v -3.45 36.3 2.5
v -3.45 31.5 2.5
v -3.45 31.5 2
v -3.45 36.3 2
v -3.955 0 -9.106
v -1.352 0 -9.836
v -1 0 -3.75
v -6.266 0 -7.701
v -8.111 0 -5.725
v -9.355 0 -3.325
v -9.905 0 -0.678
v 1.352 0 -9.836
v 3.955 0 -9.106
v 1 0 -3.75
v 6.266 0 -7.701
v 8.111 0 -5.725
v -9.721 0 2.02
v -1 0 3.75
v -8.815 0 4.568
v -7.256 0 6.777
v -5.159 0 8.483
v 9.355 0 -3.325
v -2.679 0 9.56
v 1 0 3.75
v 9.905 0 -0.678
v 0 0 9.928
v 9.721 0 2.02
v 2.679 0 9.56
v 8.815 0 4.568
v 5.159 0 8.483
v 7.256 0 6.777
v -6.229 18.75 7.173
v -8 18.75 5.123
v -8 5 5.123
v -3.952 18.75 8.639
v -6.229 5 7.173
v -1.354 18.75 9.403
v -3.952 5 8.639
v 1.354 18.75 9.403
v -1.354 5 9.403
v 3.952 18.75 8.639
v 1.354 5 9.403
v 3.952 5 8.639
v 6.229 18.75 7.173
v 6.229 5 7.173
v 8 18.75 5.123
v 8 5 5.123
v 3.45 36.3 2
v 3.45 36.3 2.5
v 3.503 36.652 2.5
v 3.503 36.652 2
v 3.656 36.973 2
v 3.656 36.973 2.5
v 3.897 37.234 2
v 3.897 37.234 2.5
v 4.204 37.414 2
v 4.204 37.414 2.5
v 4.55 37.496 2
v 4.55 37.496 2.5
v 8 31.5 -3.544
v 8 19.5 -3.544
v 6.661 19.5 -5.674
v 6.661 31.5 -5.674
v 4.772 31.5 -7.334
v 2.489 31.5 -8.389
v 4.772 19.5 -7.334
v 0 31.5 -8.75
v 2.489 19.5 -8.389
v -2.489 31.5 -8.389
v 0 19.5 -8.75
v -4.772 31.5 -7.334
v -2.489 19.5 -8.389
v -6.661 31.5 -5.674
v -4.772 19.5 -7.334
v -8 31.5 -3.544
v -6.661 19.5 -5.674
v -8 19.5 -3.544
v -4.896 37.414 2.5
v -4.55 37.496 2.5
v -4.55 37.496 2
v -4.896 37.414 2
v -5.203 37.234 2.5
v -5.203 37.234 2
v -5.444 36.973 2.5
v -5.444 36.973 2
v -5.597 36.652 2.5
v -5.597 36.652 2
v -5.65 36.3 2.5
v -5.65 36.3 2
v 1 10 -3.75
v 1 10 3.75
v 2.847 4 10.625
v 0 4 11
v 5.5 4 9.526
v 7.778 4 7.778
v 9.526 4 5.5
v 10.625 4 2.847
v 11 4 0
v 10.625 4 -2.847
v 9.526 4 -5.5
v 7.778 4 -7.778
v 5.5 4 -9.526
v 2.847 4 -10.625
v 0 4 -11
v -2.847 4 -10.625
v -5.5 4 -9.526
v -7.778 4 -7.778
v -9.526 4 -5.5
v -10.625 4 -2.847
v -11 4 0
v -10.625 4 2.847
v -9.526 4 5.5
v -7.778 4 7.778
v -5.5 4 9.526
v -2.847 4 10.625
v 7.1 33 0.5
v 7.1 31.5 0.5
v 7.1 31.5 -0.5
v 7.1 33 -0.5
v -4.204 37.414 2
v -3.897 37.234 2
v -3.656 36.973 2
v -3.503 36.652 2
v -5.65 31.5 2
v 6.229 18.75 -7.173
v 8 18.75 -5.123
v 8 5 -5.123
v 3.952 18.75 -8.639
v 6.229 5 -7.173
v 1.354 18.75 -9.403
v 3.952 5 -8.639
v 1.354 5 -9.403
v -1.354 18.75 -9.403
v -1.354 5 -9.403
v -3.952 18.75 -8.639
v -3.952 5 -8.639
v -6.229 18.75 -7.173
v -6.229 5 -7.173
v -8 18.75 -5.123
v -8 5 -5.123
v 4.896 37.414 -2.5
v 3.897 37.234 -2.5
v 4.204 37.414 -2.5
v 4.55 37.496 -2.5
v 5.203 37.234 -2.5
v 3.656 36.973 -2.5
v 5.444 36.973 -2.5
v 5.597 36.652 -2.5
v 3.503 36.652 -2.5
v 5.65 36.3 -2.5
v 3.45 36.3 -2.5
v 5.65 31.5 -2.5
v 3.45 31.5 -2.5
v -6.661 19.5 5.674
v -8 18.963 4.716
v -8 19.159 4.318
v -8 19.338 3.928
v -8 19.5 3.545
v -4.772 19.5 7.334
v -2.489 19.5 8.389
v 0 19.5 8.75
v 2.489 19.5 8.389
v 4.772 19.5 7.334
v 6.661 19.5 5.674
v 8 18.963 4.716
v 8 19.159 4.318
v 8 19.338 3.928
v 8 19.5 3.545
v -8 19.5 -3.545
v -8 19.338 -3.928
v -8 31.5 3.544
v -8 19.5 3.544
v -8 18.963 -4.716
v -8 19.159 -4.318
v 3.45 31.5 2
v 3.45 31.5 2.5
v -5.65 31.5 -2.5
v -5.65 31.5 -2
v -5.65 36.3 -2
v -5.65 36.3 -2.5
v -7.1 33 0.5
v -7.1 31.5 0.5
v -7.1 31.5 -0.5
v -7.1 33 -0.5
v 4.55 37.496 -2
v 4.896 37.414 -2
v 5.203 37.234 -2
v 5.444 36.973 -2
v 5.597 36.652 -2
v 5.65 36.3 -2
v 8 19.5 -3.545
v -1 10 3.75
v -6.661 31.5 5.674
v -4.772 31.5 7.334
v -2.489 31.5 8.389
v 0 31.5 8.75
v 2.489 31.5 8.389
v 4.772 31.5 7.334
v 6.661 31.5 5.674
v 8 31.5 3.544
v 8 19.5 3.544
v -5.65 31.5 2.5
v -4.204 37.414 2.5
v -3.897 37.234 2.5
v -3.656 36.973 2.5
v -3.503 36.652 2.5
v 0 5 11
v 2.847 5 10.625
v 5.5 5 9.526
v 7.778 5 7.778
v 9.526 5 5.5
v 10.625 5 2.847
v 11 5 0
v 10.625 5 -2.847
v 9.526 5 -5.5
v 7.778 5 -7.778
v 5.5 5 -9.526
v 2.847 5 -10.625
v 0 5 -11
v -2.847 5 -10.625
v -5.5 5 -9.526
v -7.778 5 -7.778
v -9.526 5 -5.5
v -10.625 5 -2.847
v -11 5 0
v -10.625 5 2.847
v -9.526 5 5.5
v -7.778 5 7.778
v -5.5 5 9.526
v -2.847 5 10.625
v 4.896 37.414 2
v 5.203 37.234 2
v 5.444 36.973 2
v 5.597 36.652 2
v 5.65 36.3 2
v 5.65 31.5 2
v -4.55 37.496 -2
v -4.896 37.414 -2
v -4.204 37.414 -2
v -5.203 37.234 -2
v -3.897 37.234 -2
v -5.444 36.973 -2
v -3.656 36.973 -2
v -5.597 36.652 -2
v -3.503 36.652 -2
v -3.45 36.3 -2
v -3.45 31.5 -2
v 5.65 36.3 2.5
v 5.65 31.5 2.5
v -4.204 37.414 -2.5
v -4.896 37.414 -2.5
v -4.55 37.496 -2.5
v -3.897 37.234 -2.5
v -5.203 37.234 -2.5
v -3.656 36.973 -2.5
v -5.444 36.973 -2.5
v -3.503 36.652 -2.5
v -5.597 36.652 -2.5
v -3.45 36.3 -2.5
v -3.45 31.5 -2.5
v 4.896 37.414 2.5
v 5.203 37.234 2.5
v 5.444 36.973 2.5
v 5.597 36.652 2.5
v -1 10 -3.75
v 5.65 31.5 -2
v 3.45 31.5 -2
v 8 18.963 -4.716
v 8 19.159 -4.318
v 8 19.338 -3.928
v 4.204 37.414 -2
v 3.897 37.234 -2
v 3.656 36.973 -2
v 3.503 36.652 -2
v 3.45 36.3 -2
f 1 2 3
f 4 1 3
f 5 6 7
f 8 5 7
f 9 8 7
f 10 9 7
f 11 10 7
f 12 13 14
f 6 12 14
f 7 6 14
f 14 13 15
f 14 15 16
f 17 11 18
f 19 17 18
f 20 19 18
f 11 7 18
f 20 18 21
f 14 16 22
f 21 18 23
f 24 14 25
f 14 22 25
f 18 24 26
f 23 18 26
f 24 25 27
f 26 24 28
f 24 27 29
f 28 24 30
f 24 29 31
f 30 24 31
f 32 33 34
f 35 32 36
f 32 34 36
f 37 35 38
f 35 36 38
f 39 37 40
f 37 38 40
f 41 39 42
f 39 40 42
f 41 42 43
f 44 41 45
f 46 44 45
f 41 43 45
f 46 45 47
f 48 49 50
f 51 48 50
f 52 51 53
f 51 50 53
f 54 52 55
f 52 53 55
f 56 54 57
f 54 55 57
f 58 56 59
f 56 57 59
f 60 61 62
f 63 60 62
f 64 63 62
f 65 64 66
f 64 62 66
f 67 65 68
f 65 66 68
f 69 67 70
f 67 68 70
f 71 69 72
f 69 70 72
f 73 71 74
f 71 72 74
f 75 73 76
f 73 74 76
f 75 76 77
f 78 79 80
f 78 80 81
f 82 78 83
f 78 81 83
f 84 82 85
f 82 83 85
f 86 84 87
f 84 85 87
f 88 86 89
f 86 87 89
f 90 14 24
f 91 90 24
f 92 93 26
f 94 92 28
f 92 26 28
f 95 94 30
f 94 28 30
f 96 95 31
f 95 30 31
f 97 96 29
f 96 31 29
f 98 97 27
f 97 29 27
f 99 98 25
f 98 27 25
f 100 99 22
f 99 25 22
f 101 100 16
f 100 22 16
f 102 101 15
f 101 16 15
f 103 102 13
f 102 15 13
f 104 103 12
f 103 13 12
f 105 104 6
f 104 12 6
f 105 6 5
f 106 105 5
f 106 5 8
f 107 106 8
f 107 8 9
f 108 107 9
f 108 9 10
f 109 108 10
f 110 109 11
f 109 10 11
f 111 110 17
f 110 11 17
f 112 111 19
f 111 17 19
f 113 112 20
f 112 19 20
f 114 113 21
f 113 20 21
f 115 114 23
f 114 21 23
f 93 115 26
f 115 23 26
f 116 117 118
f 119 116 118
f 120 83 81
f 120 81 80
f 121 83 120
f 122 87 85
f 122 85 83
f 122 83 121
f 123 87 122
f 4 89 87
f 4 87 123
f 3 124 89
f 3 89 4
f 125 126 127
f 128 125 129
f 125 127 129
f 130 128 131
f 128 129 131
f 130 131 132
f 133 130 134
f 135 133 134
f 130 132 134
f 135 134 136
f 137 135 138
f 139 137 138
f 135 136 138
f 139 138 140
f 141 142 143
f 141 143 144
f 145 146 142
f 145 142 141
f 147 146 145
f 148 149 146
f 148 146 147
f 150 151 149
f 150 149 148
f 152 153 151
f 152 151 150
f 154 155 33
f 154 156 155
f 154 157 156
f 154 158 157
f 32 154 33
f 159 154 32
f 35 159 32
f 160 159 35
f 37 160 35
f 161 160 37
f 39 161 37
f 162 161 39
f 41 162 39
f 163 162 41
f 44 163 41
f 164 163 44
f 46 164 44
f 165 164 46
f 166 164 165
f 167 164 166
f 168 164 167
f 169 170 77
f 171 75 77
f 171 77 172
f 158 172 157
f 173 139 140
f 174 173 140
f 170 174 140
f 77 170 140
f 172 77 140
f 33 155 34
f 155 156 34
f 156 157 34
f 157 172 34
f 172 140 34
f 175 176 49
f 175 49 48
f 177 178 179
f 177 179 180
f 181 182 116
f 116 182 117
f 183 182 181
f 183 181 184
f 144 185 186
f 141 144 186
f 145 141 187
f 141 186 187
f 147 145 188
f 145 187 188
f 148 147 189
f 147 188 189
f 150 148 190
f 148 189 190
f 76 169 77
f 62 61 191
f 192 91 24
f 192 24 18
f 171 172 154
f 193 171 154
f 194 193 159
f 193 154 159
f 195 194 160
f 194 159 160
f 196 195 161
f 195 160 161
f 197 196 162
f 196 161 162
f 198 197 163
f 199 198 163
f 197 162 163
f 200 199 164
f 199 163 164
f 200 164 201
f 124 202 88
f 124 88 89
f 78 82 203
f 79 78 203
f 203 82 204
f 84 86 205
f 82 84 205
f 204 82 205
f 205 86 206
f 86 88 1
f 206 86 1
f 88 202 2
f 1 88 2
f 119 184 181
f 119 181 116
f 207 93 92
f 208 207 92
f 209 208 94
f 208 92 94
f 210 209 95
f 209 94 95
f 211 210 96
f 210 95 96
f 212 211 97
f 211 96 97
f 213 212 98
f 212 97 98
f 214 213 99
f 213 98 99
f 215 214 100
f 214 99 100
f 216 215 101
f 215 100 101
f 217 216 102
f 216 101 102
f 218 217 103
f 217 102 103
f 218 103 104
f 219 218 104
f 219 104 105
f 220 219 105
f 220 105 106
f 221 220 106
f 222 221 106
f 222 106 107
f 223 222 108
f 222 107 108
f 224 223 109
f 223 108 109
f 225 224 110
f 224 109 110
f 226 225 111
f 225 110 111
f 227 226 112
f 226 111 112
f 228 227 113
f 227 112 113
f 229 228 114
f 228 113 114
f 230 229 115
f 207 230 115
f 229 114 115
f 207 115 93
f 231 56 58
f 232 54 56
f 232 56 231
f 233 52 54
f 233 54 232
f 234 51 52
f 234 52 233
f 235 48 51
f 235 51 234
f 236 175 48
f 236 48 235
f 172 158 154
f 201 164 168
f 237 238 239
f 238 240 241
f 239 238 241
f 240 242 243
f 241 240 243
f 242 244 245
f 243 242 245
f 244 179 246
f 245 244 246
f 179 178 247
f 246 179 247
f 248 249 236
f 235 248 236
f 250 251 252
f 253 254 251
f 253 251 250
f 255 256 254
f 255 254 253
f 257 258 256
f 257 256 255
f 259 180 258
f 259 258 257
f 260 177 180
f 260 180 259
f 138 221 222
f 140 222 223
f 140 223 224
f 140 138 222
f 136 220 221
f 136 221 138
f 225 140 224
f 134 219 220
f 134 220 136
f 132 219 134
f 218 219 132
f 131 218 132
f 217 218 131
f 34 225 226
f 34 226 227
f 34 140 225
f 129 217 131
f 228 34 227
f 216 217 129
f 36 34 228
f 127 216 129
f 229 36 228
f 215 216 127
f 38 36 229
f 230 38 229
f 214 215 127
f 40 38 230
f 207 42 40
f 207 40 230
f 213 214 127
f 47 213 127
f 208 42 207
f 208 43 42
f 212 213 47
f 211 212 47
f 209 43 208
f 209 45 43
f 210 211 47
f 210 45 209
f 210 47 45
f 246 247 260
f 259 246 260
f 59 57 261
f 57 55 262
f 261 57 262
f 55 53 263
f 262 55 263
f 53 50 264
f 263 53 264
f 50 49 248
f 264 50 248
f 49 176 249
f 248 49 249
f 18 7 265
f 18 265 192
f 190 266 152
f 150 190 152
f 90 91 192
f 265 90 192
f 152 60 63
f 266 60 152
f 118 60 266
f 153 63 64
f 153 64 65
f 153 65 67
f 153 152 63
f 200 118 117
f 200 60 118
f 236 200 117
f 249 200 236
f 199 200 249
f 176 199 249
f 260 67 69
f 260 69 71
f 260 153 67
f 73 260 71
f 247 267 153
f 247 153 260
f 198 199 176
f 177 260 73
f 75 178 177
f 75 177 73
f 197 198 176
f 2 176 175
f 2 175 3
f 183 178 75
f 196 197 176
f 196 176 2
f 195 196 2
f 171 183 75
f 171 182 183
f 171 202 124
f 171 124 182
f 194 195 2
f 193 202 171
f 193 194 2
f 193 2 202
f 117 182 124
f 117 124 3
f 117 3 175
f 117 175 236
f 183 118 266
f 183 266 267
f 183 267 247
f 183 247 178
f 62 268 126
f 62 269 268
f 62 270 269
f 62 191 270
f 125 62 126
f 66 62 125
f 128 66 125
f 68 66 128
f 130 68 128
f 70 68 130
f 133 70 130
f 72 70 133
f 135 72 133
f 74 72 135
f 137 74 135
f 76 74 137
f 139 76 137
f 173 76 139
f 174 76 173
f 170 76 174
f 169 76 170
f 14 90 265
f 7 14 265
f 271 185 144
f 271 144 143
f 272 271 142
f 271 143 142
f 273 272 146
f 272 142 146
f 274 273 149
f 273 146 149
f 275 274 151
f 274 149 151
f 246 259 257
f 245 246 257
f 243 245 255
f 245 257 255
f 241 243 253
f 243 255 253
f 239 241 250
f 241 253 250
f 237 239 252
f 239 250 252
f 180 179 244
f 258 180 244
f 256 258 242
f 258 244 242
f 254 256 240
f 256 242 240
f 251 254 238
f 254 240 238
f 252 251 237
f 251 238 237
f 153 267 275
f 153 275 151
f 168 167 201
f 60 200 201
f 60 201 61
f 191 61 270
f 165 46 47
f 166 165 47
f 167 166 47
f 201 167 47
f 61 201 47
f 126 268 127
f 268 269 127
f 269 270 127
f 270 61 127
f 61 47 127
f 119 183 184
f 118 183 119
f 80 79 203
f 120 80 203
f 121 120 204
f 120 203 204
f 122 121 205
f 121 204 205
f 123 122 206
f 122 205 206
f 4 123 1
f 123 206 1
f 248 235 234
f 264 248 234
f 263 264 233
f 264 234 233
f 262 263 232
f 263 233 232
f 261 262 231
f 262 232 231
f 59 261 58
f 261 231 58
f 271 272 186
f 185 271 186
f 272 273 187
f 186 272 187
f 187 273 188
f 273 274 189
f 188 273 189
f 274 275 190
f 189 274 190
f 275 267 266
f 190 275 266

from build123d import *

# Parameters (mm, degrees)
SKETCH_1_R          = 11
EXTRUDE_1_DEPTH     = 5
CHAMFER_1_SIZE      = 4
CHAMFER_1_SIZE2     = 1.07179677
EXTRUDE_3_DEPTH     = 26.5
SKETCH_4_W          = 2
SKETCH_4_H          = 7.5
CUT_EXTRUDE_1_DEPTH = 10
SKETCH_6_W          = 2.2
SKETCH_6_H          = 0.5
EXTRUDE_1_2_DEPTH   = 6
SKETCH_7_W          = 14.2
SKETCH_7_H          = 1
EXTRUDE_2_DEPTH     = 1.5
CUT_EXTRUDE_START   = -12
SKETCH_9_R          = 9.5
SKETCH_9_R_2        = 8.75
CUT_EXTRUDE_2_DEPTH = 12
CHAMFER_2_SIZE      = 0.75
FILLET_1_R          = 1.2


# Some blends are built 0.0001 mm under size
with BuildPart() as part:
    # 草图1 → Extrude 1 (new body)
    with BuildSketch(Plane(origin=(0, 0, 0), x_dir=(1, 0, 0), z_dir=(0, 1, 0))):
        with Locations(Location((0, 0, 0), (0, 0, 270))):
            Circle(SKETCH_1_R)
    extrude(amount=EXTRUDE_1_DEPTH)

    # 倒角1
    chamfer_1_edges = [part.edges().sort_by_distance(p)[0] for p in [
        (0, 0, -11),
    ]]
    chamfer_1_side = [part.faces().sort_by_distance(p)[0] for p in [
        (0, 2.5, -11),
    ]]
    chamfer(chamfer_1_edges, length=CHAMFER_1_SIZE, length2=CHAMFER_1_SIZE2, reference=chamfer_1_side[0])

    # 草图3 → 拉伸3 (add)
    with BuildSketch(Plane(origin=(0, 5, 0), x_dir=(-1, 0, 0), z_dir=(0, 1, 0))):
        with BuildLine():
            Line((-8, 5.123475383), (-8, -5.123475383))
            ThreePointArc((-8, -5.123475383), (0, -9.5), (8, -5.123475383))
            Line((8, -5.123475383), (8, 5.123475383))
            ThreePointArc((8, 5.123475383), (0, 9.5), (-8, 5.123475383))
        make_face()
    extrude(amount=EXTRUDE_3_DEPTH)

    # 草图4 → 切除-拉伸1 (cut)
    with BuildSketch(Plane(origin=(0, 0, 0), x_dir=(-1, 0, 0), z_dir=(0, 1, 0))):
        Rectangle(SKETCH_4_W, SKETCH_4_H)
    extrude(amount=CUT_EXTRUDE_1_DEPTH, mode=Mode.SUBTRACT)

    # 草图6 → Extrude 1 2 (add)
    with BuildSketch(Plane(origin=(0, 31.5, 0), x_dir=(1, 0, 0), z_dir=(0, 1, 0))):
        with Locations((4.55, 2.25)):
            Rectangle(SKETCH_6_W, SKETCH_6_H)
        with Locations((-4.55, 2.25)):
            Rectangle(SKETCH_6_W, SKETCH_6_H)
        with Locations((4.55, -2.25)):
            Rectangle(SKETCH_6_W, SKETCH_6_H)
        with Locations((-4.55, -2.25)):
            Rectangle(SKETCH_6_W, SKETCH_6_H)
    extrude(amount=EXTRUDE_1_2_DEPTH)

    # 草图7 → 凸台-拉伸2 (add)
    with BuildSketch(Plane(origin=(0, 31.5, 0), x_dir=(1, 0, 0), z_dir=(0, 1, 0))):
        Rectangle(SKETCH_7_W, SKETCH_7_H)
    extrude(amount=EXTRUDE_2_DEPTH)

    # 草图9 → 切除-拉伸2 (cut)
    with BuildSketch(Plane(origin=(0, 31.5, 0), x_dir=(1, 0, 0), z_dir=(0, 1, 0)).offset(CUT_EXTRUDE_START)):
        Circle(SKETCH_9_R)
        Circle(SKETCH_9_R_2, mode=Mode.SUBTRACT)
    extrude(amount=CUT_EXTRUDE_2_DEPTH, mode=Mode.SUBTRACT)

    # 倒角2
    chamfer_2_edges = [part.edges().sort_by_distance(p)[0] for p in [
        (0, 19.5, 9.5),
        (0, 19.5, -9.5),
    ]]
    chamfer(chamfer_2_edges, length=CHAMFER_2_SIZE - 0.0001)  # a hair under: the kernel refuses the full size

    # 圆角1
    # the kernel refuses this fillet: 1.2 mm, written as the material it takes off along each edge
    with BuildSketch(Plane(origin=(-3.45, 37.5, -5.5), x_dir=(0, -1, 0), z_dir=(0, 0, 1)), Plane(origin=(-5.65, 37.5, 1), x_dir=(0, -1, 0), z_dir=(0, 0, -1)), Plane(origin=(5.65, 37.5, -1), x_dir=(0, -1, 0), z_dir=(0, 0, 1)), Plane(origin=(3.45, 37.5, 5.5), x_dir=(0, -1, 0), z_dir=(0, 0, -1))) as fillet_1_piece_1:
        with BuildLine():
            CenterArc((FILLET_1_R, -FILLET_1_R), FILLET_1_R, 90, 90)
            Line((0, -FILLET_1_R), (0, 0))
            Line((0, 0), (FILLET_1_R, 0))
        make_face()
    extrude(amount=6.5, mode=Mode.SUBTRACT)
    with BuildSketch(Plane(origin=(3.45, 37.5, -5.5), x_dir=(0, -1, 0), z_dir=(0, 0, 1)), Plane(origin=(5.65, 37.5, 1), x_dir=(0, -1, 0), z_dir=(0, 0, -1)), Plane(origin=(-5.65, 37.5, -1), x_dir=(0, -1, 0), z_dir=(0, 0, 1)), Plane(origin=(-3.45, 37.5, 5.5), x_dir=(0, -1, 0), z_dir=(0, 0, -1))) as fillet_1_piece_2:
        with BuildLine():
            CenterArc((FILLET_1_R, FILLET_1_R), FILLET_1_R, 180, 90)
            Line((0, FILLET_1_R), (0, 0))
            Line((0, 0), (FILLET_1_R, 0))
        make_face()
    extrude(amount=6.5, mode=Mode.SUBTRACT)


solid = part.part
